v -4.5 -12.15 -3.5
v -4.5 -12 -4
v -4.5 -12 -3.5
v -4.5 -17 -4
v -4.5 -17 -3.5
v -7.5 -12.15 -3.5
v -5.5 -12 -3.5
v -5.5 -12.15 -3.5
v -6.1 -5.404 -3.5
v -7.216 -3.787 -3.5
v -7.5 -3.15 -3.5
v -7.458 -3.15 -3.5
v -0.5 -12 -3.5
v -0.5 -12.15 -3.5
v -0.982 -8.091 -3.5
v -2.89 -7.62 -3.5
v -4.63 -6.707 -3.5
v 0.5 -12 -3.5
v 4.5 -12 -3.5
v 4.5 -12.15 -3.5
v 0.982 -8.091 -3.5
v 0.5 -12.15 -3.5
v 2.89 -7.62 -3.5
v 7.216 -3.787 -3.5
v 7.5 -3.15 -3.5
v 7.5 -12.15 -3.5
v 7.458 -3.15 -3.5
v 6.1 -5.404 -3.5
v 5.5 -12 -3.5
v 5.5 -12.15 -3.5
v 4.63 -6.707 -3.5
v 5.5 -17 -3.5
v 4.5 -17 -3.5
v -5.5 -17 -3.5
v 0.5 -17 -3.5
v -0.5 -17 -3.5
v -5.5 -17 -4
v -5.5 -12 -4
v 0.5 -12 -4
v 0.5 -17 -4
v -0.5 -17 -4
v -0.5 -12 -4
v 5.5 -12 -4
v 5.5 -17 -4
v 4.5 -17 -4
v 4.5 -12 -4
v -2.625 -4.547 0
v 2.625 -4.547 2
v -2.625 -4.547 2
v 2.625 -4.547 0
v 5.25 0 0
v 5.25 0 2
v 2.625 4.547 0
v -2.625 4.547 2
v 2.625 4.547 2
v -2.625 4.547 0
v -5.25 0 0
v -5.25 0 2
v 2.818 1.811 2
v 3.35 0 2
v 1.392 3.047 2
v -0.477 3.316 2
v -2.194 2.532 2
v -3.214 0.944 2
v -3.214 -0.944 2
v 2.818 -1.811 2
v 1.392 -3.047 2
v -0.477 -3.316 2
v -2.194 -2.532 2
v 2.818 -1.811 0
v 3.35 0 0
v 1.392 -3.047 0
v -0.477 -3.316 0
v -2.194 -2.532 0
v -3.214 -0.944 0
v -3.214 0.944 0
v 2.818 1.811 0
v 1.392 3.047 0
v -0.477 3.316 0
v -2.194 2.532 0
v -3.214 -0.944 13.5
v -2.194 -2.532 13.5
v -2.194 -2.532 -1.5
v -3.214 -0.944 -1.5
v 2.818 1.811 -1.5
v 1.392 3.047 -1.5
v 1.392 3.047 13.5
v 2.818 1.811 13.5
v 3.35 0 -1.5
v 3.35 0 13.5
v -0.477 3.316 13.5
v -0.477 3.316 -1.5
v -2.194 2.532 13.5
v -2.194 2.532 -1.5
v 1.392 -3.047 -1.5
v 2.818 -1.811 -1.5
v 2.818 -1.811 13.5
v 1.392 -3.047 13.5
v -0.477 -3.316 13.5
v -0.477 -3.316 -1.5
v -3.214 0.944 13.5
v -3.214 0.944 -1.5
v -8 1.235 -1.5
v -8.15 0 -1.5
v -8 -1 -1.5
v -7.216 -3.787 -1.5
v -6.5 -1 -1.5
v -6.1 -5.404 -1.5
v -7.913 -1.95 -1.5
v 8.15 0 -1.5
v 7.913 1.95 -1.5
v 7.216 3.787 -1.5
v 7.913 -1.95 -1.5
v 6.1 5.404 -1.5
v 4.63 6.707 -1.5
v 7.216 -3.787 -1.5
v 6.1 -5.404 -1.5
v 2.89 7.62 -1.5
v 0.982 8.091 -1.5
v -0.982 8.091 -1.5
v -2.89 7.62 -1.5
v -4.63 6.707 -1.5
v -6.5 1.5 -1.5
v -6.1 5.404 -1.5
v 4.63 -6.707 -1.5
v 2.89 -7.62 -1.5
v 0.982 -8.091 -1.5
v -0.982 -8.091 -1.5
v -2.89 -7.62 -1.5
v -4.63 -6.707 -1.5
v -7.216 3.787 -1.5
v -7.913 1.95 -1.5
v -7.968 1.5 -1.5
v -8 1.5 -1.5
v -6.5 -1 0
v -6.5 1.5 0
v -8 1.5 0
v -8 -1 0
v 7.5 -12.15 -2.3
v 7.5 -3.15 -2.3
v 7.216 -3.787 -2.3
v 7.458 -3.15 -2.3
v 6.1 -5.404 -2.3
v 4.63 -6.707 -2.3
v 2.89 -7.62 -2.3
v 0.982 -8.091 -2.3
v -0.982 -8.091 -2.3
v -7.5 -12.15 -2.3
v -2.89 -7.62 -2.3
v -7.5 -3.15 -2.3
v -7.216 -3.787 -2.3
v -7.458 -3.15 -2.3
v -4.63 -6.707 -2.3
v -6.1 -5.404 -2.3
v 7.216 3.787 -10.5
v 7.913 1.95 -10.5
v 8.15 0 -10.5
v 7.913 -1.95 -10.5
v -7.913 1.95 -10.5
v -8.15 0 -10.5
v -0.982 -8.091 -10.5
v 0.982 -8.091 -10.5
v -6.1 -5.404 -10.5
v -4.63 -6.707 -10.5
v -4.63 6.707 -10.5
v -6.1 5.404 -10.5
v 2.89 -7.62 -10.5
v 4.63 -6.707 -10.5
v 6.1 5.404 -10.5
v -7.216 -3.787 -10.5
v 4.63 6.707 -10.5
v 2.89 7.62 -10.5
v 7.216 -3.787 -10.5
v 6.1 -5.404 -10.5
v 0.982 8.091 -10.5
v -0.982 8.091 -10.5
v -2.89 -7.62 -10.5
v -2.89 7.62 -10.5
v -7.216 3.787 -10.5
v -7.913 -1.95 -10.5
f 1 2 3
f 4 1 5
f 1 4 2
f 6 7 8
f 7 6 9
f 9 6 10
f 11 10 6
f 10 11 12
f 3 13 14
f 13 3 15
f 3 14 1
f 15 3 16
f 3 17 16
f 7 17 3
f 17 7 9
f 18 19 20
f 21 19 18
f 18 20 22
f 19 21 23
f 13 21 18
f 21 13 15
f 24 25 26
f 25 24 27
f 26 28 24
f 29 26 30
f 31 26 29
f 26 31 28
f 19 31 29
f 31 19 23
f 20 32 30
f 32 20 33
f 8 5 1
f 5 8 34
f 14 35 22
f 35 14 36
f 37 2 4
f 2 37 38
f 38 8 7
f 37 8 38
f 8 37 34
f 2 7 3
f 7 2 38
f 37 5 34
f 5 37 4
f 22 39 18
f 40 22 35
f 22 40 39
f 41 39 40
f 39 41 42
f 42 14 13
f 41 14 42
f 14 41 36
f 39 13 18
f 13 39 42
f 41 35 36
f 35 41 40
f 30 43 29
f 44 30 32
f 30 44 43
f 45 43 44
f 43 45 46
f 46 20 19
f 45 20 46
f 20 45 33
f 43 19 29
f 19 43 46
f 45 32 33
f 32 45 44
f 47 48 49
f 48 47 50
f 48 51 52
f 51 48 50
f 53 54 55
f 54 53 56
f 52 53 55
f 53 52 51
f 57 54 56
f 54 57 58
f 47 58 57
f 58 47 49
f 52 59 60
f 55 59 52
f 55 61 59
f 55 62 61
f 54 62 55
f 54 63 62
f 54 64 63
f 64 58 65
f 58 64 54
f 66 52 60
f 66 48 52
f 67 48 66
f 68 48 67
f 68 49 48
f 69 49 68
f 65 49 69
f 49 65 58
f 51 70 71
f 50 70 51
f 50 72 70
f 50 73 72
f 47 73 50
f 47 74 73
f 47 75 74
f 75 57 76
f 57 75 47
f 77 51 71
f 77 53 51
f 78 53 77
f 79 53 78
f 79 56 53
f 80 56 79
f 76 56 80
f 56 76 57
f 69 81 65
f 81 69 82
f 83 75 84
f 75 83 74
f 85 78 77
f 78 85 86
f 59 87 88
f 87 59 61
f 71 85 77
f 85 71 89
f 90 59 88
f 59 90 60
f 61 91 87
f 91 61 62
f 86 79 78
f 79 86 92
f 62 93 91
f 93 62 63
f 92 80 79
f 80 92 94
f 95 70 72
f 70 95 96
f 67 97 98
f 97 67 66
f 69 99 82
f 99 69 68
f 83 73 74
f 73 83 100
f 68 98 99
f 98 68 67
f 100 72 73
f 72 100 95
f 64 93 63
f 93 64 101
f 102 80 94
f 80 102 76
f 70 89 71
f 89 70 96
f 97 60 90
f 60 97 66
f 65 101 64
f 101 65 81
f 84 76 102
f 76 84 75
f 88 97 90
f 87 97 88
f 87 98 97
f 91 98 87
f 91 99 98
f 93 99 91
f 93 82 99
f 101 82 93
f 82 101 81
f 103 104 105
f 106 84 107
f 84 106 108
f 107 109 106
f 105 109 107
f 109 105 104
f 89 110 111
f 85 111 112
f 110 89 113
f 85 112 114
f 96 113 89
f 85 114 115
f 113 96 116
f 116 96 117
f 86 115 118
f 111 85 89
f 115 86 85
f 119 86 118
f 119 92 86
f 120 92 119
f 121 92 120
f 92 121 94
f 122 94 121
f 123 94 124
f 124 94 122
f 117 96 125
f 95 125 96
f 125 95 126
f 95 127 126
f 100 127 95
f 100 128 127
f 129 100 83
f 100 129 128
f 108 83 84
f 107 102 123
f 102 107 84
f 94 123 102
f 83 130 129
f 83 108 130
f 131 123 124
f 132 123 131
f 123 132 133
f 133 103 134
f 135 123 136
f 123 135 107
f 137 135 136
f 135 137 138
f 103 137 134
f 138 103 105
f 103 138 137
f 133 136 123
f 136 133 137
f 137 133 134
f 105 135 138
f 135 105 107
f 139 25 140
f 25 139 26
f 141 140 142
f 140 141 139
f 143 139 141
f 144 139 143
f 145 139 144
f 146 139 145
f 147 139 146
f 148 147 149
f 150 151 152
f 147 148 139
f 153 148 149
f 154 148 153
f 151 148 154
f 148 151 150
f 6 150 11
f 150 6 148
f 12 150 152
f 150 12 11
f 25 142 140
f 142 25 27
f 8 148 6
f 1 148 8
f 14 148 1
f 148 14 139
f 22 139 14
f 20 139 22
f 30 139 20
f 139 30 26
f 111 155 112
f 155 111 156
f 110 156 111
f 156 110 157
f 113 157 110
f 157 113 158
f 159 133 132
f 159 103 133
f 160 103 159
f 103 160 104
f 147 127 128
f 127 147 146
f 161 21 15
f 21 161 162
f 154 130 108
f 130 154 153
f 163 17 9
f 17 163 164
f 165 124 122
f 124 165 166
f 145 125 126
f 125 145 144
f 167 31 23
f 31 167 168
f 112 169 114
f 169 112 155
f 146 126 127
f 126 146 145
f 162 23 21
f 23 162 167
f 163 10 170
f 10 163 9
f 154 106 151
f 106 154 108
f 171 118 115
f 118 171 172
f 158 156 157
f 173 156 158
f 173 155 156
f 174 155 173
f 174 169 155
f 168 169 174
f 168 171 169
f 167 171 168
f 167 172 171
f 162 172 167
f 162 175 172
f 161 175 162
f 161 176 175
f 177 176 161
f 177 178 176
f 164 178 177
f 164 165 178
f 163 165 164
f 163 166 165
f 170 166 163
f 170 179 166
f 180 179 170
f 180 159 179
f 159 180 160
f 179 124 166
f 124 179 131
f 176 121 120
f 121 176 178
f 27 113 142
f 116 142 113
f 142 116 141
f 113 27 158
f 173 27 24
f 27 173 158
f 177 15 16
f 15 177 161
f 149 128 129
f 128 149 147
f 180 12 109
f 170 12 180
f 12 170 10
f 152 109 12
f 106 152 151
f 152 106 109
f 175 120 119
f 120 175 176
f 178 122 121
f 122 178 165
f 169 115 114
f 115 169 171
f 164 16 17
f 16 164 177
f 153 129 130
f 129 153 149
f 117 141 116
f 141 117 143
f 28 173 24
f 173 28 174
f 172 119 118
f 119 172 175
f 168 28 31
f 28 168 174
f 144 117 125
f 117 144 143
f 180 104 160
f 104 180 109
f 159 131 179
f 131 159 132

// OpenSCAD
potentiometer();
module potentiometer(){
    cylinder(d=10.5,h=2,$fn=6);
    translate([0,0,-1.5]) cylinder(d=6.7,h=15);
    translate([-8,-1,-1.5]) cube([1.5,2.5,1.5]);
    translate([-7.5,-12.15,-3.5]) cube([15,9,1.2]);
    for (i=[0:2]){
        translate([i*5-5.5,-17,-4]) cube([1,5,.5]);
    }
    translate([0,0,-10.5]) cylinder(d=16.3,h=9);
}
